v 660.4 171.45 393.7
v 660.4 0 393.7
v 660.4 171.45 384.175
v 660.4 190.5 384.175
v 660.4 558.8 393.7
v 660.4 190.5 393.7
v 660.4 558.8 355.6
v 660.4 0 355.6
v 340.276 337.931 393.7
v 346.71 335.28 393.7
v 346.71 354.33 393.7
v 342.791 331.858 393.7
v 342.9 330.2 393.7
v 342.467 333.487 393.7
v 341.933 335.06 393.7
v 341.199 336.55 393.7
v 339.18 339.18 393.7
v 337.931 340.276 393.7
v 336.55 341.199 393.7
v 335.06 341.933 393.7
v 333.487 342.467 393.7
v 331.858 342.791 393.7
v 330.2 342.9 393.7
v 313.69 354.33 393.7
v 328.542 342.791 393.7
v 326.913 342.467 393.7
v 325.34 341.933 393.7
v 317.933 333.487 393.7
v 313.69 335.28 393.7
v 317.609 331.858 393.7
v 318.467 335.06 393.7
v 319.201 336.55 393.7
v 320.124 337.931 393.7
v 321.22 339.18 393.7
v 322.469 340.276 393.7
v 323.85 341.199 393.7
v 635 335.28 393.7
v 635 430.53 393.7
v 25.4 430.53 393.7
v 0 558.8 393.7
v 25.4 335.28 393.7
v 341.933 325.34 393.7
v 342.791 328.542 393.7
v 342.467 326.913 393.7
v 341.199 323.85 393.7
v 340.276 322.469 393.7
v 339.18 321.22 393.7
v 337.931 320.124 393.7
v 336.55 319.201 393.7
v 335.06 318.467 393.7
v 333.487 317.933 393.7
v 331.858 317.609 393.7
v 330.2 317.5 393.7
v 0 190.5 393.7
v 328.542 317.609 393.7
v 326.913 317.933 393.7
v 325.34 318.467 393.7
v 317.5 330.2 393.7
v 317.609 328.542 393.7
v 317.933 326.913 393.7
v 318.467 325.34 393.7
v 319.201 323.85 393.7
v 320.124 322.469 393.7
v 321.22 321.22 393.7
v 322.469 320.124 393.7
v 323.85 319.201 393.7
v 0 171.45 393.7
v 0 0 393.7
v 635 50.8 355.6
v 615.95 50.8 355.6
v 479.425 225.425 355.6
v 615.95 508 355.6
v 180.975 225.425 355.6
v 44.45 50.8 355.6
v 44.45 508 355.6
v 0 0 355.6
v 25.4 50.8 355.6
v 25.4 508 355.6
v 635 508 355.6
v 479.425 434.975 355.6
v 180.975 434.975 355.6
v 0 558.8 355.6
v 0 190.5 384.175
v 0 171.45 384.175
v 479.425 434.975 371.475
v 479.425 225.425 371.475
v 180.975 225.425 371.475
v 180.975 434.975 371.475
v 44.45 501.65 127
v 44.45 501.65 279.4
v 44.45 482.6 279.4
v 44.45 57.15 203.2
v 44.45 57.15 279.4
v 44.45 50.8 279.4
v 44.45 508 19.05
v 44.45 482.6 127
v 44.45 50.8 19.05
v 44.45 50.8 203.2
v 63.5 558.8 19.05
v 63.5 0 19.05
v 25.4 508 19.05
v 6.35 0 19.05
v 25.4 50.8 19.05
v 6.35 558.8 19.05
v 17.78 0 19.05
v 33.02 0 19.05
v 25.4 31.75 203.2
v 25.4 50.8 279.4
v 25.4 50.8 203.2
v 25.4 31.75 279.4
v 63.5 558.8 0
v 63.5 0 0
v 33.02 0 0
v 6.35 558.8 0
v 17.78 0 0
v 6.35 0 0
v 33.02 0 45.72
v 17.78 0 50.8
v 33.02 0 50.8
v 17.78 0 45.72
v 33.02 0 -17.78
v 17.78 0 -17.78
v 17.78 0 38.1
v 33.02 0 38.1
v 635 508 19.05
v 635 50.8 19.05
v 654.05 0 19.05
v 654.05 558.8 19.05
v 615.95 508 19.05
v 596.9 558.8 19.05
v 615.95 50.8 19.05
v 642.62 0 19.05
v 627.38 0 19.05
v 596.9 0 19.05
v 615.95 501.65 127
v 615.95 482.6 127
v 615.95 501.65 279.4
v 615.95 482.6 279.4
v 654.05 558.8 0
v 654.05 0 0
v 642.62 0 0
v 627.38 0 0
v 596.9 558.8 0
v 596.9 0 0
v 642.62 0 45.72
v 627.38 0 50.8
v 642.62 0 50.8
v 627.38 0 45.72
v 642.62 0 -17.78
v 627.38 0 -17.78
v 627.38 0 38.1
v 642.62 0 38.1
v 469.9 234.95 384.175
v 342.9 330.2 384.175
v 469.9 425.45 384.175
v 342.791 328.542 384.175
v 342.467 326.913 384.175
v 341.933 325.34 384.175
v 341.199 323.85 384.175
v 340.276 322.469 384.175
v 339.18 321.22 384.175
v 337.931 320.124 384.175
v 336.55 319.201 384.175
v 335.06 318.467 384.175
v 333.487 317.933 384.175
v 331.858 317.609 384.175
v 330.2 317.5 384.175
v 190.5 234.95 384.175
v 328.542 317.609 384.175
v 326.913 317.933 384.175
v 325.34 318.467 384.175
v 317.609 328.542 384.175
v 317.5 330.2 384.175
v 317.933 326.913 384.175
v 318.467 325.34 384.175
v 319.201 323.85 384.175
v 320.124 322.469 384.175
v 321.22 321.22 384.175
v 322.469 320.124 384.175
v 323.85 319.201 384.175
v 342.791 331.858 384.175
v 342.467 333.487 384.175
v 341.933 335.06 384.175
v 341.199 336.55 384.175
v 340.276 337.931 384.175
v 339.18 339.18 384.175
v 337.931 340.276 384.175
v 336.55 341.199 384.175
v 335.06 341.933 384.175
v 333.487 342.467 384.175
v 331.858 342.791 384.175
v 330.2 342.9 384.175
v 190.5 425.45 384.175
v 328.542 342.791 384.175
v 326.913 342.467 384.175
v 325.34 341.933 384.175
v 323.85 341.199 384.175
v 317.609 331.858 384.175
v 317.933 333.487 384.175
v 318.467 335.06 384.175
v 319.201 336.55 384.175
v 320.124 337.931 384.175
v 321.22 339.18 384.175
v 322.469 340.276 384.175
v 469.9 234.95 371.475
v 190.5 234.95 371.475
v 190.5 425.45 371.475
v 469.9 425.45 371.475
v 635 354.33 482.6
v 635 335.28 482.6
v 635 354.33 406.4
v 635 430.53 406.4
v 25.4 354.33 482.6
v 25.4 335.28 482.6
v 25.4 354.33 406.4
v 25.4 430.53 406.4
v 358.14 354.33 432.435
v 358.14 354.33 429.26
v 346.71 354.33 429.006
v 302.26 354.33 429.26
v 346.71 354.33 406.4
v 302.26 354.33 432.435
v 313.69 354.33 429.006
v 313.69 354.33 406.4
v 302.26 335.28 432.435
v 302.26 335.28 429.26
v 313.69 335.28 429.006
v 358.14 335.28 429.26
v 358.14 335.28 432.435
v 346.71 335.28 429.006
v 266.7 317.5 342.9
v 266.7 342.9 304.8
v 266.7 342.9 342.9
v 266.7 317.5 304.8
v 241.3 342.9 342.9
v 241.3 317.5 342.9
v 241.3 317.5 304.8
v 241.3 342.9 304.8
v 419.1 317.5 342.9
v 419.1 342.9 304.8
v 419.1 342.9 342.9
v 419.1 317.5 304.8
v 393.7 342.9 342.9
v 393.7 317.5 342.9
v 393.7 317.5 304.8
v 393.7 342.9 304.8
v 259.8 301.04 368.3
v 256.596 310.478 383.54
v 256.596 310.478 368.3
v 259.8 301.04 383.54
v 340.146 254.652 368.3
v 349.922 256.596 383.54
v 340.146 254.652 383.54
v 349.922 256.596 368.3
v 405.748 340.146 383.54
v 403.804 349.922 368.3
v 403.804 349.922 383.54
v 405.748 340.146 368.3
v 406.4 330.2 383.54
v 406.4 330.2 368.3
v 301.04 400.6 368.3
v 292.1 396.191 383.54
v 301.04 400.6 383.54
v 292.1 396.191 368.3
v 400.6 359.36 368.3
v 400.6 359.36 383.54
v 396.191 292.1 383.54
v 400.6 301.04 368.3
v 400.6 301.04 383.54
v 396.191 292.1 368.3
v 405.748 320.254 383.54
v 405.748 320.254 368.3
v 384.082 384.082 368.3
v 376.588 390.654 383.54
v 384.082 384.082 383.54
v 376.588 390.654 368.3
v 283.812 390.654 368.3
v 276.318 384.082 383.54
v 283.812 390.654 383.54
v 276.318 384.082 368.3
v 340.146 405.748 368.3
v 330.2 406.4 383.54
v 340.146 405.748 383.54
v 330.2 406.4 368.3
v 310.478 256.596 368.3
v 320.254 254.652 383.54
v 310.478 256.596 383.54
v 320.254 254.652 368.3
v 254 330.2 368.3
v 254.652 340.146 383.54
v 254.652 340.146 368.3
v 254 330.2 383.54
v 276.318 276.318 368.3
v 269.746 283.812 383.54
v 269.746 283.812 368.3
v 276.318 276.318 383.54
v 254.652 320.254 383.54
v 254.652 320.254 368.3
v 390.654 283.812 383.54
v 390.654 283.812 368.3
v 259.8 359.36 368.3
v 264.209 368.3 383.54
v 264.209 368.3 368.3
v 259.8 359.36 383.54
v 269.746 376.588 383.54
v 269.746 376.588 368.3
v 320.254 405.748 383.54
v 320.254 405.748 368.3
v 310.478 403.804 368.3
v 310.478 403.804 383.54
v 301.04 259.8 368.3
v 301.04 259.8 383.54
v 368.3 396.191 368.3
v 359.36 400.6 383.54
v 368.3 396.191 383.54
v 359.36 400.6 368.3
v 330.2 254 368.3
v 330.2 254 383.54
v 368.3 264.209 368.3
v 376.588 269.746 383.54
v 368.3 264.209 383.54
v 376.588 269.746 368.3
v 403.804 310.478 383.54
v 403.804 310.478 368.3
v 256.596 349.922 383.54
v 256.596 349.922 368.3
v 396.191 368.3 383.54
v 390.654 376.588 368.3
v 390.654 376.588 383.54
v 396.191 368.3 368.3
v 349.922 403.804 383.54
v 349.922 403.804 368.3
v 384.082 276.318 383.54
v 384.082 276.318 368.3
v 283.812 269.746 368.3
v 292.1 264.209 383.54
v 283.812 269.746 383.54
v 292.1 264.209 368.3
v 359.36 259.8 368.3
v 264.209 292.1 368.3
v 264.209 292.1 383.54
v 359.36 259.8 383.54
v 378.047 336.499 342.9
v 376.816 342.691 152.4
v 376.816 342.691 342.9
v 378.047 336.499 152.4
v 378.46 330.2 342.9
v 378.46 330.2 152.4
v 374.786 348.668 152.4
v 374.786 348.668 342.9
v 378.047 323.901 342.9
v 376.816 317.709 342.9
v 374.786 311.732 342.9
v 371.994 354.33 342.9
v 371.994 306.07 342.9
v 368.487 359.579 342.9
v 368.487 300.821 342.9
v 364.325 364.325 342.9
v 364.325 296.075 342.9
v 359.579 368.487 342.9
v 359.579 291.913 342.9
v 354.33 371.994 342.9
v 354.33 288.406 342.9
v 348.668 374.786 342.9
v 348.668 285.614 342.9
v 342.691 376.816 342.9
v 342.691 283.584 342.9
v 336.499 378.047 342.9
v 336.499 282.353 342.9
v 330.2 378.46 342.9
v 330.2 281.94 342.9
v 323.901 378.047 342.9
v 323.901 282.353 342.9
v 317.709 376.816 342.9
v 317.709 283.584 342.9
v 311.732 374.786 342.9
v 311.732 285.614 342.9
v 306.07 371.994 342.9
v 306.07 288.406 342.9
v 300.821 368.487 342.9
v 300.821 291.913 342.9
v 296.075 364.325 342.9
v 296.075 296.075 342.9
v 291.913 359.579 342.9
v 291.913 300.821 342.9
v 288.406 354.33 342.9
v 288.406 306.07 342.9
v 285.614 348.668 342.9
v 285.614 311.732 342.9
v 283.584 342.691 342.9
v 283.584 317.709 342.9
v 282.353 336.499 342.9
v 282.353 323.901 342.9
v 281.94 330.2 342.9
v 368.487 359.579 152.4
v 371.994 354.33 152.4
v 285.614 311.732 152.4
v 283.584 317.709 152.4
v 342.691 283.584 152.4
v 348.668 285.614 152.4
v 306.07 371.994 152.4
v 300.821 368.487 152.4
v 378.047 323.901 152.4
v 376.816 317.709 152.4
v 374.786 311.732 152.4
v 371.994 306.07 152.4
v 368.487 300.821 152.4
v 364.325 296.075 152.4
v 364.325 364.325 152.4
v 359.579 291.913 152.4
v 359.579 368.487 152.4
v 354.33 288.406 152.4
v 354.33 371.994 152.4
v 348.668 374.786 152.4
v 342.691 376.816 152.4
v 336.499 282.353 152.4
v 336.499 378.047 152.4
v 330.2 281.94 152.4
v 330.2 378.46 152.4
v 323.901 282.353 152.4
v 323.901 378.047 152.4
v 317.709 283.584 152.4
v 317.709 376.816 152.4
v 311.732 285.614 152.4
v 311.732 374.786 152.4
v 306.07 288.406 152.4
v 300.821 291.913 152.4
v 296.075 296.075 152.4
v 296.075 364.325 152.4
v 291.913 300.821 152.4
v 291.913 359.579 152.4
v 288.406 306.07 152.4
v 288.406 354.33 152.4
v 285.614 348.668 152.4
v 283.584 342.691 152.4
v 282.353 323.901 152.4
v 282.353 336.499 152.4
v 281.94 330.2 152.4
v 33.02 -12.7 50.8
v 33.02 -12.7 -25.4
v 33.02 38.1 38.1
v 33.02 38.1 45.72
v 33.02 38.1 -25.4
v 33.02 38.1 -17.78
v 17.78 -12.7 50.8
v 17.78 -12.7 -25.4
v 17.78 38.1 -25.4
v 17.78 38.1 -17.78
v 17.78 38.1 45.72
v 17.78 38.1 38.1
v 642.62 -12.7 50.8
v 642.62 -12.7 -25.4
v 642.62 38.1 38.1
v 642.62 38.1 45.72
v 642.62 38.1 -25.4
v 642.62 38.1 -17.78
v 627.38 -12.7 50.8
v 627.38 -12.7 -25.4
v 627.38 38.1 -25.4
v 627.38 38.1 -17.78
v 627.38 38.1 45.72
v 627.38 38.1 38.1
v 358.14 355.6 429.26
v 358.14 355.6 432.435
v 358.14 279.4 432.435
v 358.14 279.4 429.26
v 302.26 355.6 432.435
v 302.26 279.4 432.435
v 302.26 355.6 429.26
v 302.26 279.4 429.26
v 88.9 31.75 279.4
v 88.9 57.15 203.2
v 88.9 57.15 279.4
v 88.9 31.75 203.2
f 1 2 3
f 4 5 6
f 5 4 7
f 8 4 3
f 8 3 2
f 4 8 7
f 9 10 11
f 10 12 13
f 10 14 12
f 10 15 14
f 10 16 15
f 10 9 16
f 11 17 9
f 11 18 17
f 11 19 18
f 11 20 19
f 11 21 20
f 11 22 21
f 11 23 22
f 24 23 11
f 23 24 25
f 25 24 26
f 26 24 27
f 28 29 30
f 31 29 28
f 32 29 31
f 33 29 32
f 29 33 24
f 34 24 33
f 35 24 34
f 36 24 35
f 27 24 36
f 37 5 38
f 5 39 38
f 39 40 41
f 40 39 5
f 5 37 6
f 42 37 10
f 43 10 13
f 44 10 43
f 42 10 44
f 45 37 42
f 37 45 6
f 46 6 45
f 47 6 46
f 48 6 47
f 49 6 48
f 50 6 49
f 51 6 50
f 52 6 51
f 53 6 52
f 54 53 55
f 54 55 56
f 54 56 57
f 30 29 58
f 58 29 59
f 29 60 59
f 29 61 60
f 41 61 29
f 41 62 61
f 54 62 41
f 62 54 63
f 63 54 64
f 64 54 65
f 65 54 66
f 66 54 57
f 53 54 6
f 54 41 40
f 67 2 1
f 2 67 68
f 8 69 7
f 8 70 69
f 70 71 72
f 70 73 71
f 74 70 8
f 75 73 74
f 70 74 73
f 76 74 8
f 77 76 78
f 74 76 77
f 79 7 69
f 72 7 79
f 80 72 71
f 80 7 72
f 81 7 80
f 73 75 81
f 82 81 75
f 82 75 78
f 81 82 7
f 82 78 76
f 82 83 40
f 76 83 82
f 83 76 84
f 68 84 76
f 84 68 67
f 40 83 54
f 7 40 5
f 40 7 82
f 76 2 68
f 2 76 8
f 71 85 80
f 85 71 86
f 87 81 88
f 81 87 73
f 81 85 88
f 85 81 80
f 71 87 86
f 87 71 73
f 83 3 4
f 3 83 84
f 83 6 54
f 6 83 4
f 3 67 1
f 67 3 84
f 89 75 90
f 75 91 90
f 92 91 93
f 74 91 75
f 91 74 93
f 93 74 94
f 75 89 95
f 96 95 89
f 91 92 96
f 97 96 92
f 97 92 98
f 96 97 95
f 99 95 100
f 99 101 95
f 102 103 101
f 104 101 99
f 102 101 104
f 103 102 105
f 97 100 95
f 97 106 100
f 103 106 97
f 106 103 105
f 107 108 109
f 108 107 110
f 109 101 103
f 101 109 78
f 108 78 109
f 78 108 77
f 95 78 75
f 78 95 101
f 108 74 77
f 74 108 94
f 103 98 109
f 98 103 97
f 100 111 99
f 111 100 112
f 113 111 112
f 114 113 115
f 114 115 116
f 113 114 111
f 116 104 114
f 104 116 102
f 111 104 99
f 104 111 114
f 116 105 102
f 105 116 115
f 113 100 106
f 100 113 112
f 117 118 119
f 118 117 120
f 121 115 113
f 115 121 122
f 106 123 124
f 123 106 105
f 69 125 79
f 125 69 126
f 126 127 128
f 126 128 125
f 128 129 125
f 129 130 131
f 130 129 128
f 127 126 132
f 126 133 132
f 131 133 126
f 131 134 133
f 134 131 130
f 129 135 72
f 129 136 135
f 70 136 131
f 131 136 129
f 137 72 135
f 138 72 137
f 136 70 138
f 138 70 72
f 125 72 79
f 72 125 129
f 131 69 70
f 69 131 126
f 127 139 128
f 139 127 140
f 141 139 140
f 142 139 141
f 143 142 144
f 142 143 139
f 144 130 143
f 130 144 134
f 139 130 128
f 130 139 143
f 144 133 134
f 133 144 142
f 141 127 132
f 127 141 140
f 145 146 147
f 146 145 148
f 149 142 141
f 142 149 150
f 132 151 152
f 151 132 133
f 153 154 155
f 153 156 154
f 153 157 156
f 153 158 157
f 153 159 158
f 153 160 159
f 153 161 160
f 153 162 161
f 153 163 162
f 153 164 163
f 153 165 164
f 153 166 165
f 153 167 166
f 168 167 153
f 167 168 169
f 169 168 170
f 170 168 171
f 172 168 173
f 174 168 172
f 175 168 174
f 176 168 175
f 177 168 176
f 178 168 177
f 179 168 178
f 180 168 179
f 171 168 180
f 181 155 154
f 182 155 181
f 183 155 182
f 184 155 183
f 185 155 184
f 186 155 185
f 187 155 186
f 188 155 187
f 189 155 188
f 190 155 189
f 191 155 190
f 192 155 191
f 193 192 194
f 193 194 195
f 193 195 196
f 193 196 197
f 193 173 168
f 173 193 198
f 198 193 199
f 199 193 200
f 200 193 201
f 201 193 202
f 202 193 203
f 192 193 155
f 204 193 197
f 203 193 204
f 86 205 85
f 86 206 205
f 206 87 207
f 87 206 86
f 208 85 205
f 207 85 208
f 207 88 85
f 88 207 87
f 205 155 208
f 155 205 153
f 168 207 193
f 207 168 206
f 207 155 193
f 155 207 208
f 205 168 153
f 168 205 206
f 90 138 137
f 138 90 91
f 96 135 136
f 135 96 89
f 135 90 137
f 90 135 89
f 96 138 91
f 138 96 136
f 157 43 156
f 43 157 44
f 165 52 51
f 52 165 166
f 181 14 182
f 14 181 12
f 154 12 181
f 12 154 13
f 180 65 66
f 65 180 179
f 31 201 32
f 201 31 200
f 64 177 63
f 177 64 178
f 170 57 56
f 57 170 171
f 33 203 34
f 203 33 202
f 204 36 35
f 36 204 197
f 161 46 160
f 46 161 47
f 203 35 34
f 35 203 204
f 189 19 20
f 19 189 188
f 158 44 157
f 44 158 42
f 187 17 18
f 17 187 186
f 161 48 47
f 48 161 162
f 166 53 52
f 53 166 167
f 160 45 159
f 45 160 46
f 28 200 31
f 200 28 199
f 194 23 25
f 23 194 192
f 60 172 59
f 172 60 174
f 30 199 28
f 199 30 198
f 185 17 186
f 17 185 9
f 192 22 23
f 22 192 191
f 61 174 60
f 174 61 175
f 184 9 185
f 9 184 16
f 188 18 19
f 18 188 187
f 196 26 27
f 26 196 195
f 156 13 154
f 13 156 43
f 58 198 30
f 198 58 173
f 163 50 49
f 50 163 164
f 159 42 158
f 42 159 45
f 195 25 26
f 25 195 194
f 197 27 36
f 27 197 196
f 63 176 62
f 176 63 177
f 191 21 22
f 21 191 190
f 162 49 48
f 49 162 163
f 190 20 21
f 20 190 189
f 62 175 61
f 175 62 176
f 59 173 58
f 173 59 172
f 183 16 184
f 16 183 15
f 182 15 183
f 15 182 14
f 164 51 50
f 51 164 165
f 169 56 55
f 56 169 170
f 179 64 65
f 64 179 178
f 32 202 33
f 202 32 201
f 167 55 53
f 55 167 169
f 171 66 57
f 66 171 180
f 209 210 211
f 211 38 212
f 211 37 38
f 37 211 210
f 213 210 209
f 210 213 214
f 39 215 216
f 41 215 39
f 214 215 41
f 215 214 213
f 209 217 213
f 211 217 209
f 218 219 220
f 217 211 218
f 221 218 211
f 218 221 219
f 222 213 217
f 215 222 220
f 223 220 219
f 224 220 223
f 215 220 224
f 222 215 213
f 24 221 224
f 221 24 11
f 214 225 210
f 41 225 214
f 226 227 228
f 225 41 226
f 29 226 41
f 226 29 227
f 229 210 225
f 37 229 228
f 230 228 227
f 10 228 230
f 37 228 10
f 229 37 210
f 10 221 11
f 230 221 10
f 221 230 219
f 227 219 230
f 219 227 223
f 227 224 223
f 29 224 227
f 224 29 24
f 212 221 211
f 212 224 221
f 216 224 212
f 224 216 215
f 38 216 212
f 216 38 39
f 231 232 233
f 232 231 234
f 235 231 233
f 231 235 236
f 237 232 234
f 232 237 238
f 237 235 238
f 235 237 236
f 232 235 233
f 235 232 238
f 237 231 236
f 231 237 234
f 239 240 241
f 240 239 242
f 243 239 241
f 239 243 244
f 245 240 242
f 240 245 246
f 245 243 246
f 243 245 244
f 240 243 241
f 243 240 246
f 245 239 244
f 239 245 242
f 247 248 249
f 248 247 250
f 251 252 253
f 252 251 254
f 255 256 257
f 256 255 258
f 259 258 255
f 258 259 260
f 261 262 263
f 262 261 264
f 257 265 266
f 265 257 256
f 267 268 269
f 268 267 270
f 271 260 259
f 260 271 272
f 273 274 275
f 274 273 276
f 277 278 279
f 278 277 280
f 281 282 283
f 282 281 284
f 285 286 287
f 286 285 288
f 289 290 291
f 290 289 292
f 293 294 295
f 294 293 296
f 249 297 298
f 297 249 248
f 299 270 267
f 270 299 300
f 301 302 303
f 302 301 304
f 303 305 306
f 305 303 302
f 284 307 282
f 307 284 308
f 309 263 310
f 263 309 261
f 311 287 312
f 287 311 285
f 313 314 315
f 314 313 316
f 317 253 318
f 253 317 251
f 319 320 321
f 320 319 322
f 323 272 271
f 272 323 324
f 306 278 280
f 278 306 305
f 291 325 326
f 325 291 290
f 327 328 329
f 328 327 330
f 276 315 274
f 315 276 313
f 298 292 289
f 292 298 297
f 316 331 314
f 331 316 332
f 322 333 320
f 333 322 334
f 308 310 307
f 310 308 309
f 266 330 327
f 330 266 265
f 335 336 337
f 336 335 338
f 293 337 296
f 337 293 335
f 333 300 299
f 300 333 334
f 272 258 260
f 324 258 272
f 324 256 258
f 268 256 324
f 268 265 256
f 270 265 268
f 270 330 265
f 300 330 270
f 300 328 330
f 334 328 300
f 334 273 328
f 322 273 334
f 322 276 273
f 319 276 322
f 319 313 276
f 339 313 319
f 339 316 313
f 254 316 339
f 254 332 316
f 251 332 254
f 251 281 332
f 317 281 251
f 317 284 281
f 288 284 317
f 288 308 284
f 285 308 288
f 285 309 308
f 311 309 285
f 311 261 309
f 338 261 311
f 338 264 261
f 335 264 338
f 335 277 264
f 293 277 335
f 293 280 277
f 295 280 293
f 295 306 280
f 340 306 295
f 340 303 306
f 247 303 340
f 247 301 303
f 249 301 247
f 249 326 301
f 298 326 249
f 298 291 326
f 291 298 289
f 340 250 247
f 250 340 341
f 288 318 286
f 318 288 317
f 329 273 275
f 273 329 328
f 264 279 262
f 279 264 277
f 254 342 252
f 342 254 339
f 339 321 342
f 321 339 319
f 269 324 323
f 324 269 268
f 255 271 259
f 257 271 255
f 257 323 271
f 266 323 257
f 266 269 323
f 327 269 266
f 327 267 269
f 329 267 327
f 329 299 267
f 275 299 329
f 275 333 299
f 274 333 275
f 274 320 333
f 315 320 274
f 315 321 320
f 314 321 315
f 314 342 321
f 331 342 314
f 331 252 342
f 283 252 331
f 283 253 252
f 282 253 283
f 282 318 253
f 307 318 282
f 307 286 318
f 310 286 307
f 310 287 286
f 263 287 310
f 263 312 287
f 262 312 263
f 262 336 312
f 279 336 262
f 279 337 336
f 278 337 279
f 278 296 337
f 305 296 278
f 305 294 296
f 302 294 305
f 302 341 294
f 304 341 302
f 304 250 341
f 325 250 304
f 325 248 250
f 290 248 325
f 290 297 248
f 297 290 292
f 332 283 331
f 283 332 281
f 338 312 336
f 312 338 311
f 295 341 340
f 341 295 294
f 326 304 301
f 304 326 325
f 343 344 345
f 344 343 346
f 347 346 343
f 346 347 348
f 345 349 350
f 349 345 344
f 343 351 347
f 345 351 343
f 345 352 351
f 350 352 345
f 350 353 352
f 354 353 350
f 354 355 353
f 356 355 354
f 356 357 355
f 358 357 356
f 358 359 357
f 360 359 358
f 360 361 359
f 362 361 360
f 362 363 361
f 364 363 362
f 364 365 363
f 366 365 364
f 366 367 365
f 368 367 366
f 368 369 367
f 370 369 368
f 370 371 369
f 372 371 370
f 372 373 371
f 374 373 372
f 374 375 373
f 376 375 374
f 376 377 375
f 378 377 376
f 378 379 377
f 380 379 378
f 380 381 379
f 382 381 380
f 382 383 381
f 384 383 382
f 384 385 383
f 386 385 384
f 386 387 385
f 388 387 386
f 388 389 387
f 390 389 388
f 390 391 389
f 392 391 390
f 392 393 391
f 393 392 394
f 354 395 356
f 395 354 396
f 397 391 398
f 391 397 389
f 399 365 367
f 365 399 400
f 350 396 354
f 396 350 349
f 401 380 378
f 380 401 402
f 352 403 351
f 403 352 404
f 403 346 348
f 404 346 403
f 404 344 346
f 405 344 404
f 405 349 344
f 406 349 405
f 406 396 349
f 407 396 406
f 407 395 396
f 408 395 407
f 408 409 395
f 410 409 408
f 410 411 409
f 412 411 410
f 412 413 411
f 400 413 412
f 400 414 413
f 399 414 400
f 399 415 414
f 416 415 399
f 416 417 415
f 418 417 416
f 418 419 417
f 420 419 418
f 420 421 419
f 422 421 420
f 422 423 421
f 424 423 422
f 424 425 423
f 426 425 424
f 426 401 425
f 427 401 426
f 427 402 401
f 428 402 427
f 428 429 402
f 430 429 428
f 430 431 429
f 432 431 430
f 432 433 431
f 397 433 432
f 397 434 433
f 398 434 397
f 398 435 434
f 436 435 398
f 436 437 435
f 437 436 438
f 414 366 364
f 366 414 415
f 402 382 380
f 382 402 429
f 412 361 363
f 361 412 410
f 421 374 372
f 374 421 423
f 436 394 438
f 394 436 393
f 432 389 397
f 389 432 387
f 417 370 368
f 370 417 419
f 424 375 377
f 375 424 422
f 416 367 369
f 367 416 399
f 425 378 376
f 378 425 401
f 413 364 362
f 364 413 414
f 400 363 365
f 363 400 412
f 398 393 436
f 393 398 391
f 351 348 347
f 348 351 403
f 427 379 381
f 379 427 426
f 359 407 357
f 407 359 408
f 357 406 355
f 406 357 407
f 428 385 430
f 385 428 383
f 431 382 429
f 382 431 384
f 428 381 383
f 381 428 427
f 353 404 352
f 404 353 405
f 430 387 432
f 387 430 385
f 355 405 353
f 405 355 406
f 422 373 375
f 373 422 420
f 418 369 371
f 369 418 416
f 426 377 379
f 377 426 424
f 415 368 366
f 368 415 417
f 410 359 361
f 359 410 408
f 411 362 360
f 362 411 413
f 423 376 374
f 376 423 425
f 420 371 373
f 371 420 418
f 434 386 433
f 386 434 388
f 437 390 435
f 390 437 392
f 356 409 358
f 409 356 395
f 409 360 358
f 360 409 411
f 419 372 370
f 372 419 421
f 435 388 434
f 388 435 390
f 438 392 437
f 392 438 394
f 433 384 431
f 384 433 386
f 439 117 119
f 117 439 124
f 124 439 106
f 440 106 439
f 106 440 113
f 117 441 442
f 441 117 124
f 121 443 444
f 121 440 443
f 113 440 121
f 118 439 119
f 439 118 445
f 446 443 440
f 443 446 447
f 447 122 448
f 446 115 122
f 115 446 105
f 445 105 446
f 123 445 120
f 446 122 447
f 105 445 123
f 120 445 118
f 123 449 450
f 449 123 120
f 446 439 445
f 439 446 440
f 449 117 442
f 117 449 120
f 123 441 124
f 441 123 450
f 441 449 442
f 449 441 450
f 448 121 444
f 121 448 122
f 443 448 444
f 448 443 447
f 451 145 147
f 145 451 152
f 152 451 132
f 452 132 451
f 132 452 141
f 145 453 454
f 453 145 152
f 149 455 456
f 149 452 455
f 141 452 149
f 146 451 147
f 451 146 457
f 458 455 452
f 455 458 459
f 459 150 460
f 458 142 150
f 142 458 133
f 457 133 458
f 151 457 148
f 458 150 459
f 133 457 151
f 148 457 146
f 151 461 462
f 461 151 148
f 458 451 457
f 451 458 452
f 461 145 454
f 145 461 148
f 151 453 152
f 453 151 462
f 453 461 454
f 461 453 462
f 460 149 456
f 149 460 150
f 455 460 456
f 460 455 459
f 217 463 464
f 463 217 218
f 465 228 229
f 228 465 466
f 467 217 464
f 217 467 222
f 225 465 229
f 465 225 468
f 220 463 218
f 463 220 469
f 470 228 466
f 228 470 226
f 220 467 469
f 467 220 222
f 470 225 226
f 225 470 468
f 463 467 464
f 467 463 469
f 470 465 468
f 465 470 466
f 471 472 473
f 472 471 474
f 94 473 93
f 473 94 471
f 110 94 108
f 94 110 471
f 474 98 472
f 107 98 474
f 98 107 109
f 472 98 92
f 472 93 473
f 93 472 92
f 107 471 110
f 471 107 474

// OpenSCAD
// Concept envelope, not a mounting/drilling template. Select the actual plate
// and jig before fixing the recess, slot, mounting screws, or guard clearances.
UNIT=25.4;
PART="all";
W=26; D=22; Z=14; TOP=1.5;
PX=13; PY=13; PW=11.75; PD=8.25; PT=.375;
$fn=48;
module structure() {
 difference() {
  translate([0,0,Z]) cube([W,D,TOP]);
  translate([PX-PW/2,PY-PD/2,Z-.01]) cube([PW,PD,TOP+.02]);
  translate([-.01,6.75,Z+TOP-.375]) cube([W+.02,.75,.4]);
 }
 // Two side panels, broad feet and a rear brace leave motor access open.
 for(x=[1,24.25]) {
  translate([x,2,.75]) cube([.75,18,Z-.75]);
  translate([x-.75,0,0]) cube([2.25,D,.75]);
 }
 translate([1.75,19,5]) cube([22.5,.75,6]);
 // Plate support frame: illustrative continuous ledge, positively retained
 // using the selected plate's own hardware (fastener locations not guessed).
 difference() {
  translate([PX-PW/2-.5,PY-PD/2-.5,Z+.625]) cube([PW+1,PD+1,.5]);
  translate([PX-PW/2+.375,PY-PD/2+.375,Z+.6]) cube([PW-.75,PD-.75,.6]);
 }
}
module plate() {
 difference() {
  translate([PX-PW/2,PY-PD/2,Z+TOP-PT]) cube([PW,PD,PT]);
  translate([PX,PY,Z+TOP-PT-.01]) cylinder(d=1,h=PT+.02);
 }
}
module fence() {
 difference() {
  translate([1,PY+.2,Z+TOP]) cube([24,.75,3.5]);
  translate([PX-.65,PY+.19,Z+TOP-.01]) cube([1.3,.78,1.4]);
 }
 translate([1,PY+.95,Z+TOP]) cube([24,3,.5]);
}
module router() {
 translate([PX,PY,Z+TOP-1]) cylinder(d=6,h=.6);
 translate([PX,PY,Z-8]) cylinder(d=3.8,h=7.5);
 for(x=[PX-3.5,PX+2.5])translate([x,PY-.5,Z-2])cube([1,1,1.5]);
}
module guard() { translate([PX-1.1,PY-2,Z+TOP+1.4]) cube([2.2,3,.125]); }
module controls() { translate([1,1.25,8])cube([2.5,1,3]); }
module clamps() {
 for(x=[1,25]) {
  translate([x-.3,-.5,-1])cube([.6,.5,3]);
  translate([x-.3,-.5,1.5])cube([.6,2,.3]);
  translate([x-.3,-.5,-1])cube([.6,2,.3]);
 }
}
scale(UNIT) {
 if(PART=="all" || PART=="structure")color("burlywood")structure();
 if(PART=="all" || PART=="plate")color("gray")plate();
 if(PART=="all" || PART=="fence")color("burlywood")fence();
 if(PART=="all" || PART=="router")color("teal")router();
 if(PART=="all" || PART=="guard")color([.7,.9,1,.3])guard();
 if(PART=="all" || PART=="controls")color("red")controls();
 if(PART=="all" || PART=="clamps")color("orange")clamps();
}
